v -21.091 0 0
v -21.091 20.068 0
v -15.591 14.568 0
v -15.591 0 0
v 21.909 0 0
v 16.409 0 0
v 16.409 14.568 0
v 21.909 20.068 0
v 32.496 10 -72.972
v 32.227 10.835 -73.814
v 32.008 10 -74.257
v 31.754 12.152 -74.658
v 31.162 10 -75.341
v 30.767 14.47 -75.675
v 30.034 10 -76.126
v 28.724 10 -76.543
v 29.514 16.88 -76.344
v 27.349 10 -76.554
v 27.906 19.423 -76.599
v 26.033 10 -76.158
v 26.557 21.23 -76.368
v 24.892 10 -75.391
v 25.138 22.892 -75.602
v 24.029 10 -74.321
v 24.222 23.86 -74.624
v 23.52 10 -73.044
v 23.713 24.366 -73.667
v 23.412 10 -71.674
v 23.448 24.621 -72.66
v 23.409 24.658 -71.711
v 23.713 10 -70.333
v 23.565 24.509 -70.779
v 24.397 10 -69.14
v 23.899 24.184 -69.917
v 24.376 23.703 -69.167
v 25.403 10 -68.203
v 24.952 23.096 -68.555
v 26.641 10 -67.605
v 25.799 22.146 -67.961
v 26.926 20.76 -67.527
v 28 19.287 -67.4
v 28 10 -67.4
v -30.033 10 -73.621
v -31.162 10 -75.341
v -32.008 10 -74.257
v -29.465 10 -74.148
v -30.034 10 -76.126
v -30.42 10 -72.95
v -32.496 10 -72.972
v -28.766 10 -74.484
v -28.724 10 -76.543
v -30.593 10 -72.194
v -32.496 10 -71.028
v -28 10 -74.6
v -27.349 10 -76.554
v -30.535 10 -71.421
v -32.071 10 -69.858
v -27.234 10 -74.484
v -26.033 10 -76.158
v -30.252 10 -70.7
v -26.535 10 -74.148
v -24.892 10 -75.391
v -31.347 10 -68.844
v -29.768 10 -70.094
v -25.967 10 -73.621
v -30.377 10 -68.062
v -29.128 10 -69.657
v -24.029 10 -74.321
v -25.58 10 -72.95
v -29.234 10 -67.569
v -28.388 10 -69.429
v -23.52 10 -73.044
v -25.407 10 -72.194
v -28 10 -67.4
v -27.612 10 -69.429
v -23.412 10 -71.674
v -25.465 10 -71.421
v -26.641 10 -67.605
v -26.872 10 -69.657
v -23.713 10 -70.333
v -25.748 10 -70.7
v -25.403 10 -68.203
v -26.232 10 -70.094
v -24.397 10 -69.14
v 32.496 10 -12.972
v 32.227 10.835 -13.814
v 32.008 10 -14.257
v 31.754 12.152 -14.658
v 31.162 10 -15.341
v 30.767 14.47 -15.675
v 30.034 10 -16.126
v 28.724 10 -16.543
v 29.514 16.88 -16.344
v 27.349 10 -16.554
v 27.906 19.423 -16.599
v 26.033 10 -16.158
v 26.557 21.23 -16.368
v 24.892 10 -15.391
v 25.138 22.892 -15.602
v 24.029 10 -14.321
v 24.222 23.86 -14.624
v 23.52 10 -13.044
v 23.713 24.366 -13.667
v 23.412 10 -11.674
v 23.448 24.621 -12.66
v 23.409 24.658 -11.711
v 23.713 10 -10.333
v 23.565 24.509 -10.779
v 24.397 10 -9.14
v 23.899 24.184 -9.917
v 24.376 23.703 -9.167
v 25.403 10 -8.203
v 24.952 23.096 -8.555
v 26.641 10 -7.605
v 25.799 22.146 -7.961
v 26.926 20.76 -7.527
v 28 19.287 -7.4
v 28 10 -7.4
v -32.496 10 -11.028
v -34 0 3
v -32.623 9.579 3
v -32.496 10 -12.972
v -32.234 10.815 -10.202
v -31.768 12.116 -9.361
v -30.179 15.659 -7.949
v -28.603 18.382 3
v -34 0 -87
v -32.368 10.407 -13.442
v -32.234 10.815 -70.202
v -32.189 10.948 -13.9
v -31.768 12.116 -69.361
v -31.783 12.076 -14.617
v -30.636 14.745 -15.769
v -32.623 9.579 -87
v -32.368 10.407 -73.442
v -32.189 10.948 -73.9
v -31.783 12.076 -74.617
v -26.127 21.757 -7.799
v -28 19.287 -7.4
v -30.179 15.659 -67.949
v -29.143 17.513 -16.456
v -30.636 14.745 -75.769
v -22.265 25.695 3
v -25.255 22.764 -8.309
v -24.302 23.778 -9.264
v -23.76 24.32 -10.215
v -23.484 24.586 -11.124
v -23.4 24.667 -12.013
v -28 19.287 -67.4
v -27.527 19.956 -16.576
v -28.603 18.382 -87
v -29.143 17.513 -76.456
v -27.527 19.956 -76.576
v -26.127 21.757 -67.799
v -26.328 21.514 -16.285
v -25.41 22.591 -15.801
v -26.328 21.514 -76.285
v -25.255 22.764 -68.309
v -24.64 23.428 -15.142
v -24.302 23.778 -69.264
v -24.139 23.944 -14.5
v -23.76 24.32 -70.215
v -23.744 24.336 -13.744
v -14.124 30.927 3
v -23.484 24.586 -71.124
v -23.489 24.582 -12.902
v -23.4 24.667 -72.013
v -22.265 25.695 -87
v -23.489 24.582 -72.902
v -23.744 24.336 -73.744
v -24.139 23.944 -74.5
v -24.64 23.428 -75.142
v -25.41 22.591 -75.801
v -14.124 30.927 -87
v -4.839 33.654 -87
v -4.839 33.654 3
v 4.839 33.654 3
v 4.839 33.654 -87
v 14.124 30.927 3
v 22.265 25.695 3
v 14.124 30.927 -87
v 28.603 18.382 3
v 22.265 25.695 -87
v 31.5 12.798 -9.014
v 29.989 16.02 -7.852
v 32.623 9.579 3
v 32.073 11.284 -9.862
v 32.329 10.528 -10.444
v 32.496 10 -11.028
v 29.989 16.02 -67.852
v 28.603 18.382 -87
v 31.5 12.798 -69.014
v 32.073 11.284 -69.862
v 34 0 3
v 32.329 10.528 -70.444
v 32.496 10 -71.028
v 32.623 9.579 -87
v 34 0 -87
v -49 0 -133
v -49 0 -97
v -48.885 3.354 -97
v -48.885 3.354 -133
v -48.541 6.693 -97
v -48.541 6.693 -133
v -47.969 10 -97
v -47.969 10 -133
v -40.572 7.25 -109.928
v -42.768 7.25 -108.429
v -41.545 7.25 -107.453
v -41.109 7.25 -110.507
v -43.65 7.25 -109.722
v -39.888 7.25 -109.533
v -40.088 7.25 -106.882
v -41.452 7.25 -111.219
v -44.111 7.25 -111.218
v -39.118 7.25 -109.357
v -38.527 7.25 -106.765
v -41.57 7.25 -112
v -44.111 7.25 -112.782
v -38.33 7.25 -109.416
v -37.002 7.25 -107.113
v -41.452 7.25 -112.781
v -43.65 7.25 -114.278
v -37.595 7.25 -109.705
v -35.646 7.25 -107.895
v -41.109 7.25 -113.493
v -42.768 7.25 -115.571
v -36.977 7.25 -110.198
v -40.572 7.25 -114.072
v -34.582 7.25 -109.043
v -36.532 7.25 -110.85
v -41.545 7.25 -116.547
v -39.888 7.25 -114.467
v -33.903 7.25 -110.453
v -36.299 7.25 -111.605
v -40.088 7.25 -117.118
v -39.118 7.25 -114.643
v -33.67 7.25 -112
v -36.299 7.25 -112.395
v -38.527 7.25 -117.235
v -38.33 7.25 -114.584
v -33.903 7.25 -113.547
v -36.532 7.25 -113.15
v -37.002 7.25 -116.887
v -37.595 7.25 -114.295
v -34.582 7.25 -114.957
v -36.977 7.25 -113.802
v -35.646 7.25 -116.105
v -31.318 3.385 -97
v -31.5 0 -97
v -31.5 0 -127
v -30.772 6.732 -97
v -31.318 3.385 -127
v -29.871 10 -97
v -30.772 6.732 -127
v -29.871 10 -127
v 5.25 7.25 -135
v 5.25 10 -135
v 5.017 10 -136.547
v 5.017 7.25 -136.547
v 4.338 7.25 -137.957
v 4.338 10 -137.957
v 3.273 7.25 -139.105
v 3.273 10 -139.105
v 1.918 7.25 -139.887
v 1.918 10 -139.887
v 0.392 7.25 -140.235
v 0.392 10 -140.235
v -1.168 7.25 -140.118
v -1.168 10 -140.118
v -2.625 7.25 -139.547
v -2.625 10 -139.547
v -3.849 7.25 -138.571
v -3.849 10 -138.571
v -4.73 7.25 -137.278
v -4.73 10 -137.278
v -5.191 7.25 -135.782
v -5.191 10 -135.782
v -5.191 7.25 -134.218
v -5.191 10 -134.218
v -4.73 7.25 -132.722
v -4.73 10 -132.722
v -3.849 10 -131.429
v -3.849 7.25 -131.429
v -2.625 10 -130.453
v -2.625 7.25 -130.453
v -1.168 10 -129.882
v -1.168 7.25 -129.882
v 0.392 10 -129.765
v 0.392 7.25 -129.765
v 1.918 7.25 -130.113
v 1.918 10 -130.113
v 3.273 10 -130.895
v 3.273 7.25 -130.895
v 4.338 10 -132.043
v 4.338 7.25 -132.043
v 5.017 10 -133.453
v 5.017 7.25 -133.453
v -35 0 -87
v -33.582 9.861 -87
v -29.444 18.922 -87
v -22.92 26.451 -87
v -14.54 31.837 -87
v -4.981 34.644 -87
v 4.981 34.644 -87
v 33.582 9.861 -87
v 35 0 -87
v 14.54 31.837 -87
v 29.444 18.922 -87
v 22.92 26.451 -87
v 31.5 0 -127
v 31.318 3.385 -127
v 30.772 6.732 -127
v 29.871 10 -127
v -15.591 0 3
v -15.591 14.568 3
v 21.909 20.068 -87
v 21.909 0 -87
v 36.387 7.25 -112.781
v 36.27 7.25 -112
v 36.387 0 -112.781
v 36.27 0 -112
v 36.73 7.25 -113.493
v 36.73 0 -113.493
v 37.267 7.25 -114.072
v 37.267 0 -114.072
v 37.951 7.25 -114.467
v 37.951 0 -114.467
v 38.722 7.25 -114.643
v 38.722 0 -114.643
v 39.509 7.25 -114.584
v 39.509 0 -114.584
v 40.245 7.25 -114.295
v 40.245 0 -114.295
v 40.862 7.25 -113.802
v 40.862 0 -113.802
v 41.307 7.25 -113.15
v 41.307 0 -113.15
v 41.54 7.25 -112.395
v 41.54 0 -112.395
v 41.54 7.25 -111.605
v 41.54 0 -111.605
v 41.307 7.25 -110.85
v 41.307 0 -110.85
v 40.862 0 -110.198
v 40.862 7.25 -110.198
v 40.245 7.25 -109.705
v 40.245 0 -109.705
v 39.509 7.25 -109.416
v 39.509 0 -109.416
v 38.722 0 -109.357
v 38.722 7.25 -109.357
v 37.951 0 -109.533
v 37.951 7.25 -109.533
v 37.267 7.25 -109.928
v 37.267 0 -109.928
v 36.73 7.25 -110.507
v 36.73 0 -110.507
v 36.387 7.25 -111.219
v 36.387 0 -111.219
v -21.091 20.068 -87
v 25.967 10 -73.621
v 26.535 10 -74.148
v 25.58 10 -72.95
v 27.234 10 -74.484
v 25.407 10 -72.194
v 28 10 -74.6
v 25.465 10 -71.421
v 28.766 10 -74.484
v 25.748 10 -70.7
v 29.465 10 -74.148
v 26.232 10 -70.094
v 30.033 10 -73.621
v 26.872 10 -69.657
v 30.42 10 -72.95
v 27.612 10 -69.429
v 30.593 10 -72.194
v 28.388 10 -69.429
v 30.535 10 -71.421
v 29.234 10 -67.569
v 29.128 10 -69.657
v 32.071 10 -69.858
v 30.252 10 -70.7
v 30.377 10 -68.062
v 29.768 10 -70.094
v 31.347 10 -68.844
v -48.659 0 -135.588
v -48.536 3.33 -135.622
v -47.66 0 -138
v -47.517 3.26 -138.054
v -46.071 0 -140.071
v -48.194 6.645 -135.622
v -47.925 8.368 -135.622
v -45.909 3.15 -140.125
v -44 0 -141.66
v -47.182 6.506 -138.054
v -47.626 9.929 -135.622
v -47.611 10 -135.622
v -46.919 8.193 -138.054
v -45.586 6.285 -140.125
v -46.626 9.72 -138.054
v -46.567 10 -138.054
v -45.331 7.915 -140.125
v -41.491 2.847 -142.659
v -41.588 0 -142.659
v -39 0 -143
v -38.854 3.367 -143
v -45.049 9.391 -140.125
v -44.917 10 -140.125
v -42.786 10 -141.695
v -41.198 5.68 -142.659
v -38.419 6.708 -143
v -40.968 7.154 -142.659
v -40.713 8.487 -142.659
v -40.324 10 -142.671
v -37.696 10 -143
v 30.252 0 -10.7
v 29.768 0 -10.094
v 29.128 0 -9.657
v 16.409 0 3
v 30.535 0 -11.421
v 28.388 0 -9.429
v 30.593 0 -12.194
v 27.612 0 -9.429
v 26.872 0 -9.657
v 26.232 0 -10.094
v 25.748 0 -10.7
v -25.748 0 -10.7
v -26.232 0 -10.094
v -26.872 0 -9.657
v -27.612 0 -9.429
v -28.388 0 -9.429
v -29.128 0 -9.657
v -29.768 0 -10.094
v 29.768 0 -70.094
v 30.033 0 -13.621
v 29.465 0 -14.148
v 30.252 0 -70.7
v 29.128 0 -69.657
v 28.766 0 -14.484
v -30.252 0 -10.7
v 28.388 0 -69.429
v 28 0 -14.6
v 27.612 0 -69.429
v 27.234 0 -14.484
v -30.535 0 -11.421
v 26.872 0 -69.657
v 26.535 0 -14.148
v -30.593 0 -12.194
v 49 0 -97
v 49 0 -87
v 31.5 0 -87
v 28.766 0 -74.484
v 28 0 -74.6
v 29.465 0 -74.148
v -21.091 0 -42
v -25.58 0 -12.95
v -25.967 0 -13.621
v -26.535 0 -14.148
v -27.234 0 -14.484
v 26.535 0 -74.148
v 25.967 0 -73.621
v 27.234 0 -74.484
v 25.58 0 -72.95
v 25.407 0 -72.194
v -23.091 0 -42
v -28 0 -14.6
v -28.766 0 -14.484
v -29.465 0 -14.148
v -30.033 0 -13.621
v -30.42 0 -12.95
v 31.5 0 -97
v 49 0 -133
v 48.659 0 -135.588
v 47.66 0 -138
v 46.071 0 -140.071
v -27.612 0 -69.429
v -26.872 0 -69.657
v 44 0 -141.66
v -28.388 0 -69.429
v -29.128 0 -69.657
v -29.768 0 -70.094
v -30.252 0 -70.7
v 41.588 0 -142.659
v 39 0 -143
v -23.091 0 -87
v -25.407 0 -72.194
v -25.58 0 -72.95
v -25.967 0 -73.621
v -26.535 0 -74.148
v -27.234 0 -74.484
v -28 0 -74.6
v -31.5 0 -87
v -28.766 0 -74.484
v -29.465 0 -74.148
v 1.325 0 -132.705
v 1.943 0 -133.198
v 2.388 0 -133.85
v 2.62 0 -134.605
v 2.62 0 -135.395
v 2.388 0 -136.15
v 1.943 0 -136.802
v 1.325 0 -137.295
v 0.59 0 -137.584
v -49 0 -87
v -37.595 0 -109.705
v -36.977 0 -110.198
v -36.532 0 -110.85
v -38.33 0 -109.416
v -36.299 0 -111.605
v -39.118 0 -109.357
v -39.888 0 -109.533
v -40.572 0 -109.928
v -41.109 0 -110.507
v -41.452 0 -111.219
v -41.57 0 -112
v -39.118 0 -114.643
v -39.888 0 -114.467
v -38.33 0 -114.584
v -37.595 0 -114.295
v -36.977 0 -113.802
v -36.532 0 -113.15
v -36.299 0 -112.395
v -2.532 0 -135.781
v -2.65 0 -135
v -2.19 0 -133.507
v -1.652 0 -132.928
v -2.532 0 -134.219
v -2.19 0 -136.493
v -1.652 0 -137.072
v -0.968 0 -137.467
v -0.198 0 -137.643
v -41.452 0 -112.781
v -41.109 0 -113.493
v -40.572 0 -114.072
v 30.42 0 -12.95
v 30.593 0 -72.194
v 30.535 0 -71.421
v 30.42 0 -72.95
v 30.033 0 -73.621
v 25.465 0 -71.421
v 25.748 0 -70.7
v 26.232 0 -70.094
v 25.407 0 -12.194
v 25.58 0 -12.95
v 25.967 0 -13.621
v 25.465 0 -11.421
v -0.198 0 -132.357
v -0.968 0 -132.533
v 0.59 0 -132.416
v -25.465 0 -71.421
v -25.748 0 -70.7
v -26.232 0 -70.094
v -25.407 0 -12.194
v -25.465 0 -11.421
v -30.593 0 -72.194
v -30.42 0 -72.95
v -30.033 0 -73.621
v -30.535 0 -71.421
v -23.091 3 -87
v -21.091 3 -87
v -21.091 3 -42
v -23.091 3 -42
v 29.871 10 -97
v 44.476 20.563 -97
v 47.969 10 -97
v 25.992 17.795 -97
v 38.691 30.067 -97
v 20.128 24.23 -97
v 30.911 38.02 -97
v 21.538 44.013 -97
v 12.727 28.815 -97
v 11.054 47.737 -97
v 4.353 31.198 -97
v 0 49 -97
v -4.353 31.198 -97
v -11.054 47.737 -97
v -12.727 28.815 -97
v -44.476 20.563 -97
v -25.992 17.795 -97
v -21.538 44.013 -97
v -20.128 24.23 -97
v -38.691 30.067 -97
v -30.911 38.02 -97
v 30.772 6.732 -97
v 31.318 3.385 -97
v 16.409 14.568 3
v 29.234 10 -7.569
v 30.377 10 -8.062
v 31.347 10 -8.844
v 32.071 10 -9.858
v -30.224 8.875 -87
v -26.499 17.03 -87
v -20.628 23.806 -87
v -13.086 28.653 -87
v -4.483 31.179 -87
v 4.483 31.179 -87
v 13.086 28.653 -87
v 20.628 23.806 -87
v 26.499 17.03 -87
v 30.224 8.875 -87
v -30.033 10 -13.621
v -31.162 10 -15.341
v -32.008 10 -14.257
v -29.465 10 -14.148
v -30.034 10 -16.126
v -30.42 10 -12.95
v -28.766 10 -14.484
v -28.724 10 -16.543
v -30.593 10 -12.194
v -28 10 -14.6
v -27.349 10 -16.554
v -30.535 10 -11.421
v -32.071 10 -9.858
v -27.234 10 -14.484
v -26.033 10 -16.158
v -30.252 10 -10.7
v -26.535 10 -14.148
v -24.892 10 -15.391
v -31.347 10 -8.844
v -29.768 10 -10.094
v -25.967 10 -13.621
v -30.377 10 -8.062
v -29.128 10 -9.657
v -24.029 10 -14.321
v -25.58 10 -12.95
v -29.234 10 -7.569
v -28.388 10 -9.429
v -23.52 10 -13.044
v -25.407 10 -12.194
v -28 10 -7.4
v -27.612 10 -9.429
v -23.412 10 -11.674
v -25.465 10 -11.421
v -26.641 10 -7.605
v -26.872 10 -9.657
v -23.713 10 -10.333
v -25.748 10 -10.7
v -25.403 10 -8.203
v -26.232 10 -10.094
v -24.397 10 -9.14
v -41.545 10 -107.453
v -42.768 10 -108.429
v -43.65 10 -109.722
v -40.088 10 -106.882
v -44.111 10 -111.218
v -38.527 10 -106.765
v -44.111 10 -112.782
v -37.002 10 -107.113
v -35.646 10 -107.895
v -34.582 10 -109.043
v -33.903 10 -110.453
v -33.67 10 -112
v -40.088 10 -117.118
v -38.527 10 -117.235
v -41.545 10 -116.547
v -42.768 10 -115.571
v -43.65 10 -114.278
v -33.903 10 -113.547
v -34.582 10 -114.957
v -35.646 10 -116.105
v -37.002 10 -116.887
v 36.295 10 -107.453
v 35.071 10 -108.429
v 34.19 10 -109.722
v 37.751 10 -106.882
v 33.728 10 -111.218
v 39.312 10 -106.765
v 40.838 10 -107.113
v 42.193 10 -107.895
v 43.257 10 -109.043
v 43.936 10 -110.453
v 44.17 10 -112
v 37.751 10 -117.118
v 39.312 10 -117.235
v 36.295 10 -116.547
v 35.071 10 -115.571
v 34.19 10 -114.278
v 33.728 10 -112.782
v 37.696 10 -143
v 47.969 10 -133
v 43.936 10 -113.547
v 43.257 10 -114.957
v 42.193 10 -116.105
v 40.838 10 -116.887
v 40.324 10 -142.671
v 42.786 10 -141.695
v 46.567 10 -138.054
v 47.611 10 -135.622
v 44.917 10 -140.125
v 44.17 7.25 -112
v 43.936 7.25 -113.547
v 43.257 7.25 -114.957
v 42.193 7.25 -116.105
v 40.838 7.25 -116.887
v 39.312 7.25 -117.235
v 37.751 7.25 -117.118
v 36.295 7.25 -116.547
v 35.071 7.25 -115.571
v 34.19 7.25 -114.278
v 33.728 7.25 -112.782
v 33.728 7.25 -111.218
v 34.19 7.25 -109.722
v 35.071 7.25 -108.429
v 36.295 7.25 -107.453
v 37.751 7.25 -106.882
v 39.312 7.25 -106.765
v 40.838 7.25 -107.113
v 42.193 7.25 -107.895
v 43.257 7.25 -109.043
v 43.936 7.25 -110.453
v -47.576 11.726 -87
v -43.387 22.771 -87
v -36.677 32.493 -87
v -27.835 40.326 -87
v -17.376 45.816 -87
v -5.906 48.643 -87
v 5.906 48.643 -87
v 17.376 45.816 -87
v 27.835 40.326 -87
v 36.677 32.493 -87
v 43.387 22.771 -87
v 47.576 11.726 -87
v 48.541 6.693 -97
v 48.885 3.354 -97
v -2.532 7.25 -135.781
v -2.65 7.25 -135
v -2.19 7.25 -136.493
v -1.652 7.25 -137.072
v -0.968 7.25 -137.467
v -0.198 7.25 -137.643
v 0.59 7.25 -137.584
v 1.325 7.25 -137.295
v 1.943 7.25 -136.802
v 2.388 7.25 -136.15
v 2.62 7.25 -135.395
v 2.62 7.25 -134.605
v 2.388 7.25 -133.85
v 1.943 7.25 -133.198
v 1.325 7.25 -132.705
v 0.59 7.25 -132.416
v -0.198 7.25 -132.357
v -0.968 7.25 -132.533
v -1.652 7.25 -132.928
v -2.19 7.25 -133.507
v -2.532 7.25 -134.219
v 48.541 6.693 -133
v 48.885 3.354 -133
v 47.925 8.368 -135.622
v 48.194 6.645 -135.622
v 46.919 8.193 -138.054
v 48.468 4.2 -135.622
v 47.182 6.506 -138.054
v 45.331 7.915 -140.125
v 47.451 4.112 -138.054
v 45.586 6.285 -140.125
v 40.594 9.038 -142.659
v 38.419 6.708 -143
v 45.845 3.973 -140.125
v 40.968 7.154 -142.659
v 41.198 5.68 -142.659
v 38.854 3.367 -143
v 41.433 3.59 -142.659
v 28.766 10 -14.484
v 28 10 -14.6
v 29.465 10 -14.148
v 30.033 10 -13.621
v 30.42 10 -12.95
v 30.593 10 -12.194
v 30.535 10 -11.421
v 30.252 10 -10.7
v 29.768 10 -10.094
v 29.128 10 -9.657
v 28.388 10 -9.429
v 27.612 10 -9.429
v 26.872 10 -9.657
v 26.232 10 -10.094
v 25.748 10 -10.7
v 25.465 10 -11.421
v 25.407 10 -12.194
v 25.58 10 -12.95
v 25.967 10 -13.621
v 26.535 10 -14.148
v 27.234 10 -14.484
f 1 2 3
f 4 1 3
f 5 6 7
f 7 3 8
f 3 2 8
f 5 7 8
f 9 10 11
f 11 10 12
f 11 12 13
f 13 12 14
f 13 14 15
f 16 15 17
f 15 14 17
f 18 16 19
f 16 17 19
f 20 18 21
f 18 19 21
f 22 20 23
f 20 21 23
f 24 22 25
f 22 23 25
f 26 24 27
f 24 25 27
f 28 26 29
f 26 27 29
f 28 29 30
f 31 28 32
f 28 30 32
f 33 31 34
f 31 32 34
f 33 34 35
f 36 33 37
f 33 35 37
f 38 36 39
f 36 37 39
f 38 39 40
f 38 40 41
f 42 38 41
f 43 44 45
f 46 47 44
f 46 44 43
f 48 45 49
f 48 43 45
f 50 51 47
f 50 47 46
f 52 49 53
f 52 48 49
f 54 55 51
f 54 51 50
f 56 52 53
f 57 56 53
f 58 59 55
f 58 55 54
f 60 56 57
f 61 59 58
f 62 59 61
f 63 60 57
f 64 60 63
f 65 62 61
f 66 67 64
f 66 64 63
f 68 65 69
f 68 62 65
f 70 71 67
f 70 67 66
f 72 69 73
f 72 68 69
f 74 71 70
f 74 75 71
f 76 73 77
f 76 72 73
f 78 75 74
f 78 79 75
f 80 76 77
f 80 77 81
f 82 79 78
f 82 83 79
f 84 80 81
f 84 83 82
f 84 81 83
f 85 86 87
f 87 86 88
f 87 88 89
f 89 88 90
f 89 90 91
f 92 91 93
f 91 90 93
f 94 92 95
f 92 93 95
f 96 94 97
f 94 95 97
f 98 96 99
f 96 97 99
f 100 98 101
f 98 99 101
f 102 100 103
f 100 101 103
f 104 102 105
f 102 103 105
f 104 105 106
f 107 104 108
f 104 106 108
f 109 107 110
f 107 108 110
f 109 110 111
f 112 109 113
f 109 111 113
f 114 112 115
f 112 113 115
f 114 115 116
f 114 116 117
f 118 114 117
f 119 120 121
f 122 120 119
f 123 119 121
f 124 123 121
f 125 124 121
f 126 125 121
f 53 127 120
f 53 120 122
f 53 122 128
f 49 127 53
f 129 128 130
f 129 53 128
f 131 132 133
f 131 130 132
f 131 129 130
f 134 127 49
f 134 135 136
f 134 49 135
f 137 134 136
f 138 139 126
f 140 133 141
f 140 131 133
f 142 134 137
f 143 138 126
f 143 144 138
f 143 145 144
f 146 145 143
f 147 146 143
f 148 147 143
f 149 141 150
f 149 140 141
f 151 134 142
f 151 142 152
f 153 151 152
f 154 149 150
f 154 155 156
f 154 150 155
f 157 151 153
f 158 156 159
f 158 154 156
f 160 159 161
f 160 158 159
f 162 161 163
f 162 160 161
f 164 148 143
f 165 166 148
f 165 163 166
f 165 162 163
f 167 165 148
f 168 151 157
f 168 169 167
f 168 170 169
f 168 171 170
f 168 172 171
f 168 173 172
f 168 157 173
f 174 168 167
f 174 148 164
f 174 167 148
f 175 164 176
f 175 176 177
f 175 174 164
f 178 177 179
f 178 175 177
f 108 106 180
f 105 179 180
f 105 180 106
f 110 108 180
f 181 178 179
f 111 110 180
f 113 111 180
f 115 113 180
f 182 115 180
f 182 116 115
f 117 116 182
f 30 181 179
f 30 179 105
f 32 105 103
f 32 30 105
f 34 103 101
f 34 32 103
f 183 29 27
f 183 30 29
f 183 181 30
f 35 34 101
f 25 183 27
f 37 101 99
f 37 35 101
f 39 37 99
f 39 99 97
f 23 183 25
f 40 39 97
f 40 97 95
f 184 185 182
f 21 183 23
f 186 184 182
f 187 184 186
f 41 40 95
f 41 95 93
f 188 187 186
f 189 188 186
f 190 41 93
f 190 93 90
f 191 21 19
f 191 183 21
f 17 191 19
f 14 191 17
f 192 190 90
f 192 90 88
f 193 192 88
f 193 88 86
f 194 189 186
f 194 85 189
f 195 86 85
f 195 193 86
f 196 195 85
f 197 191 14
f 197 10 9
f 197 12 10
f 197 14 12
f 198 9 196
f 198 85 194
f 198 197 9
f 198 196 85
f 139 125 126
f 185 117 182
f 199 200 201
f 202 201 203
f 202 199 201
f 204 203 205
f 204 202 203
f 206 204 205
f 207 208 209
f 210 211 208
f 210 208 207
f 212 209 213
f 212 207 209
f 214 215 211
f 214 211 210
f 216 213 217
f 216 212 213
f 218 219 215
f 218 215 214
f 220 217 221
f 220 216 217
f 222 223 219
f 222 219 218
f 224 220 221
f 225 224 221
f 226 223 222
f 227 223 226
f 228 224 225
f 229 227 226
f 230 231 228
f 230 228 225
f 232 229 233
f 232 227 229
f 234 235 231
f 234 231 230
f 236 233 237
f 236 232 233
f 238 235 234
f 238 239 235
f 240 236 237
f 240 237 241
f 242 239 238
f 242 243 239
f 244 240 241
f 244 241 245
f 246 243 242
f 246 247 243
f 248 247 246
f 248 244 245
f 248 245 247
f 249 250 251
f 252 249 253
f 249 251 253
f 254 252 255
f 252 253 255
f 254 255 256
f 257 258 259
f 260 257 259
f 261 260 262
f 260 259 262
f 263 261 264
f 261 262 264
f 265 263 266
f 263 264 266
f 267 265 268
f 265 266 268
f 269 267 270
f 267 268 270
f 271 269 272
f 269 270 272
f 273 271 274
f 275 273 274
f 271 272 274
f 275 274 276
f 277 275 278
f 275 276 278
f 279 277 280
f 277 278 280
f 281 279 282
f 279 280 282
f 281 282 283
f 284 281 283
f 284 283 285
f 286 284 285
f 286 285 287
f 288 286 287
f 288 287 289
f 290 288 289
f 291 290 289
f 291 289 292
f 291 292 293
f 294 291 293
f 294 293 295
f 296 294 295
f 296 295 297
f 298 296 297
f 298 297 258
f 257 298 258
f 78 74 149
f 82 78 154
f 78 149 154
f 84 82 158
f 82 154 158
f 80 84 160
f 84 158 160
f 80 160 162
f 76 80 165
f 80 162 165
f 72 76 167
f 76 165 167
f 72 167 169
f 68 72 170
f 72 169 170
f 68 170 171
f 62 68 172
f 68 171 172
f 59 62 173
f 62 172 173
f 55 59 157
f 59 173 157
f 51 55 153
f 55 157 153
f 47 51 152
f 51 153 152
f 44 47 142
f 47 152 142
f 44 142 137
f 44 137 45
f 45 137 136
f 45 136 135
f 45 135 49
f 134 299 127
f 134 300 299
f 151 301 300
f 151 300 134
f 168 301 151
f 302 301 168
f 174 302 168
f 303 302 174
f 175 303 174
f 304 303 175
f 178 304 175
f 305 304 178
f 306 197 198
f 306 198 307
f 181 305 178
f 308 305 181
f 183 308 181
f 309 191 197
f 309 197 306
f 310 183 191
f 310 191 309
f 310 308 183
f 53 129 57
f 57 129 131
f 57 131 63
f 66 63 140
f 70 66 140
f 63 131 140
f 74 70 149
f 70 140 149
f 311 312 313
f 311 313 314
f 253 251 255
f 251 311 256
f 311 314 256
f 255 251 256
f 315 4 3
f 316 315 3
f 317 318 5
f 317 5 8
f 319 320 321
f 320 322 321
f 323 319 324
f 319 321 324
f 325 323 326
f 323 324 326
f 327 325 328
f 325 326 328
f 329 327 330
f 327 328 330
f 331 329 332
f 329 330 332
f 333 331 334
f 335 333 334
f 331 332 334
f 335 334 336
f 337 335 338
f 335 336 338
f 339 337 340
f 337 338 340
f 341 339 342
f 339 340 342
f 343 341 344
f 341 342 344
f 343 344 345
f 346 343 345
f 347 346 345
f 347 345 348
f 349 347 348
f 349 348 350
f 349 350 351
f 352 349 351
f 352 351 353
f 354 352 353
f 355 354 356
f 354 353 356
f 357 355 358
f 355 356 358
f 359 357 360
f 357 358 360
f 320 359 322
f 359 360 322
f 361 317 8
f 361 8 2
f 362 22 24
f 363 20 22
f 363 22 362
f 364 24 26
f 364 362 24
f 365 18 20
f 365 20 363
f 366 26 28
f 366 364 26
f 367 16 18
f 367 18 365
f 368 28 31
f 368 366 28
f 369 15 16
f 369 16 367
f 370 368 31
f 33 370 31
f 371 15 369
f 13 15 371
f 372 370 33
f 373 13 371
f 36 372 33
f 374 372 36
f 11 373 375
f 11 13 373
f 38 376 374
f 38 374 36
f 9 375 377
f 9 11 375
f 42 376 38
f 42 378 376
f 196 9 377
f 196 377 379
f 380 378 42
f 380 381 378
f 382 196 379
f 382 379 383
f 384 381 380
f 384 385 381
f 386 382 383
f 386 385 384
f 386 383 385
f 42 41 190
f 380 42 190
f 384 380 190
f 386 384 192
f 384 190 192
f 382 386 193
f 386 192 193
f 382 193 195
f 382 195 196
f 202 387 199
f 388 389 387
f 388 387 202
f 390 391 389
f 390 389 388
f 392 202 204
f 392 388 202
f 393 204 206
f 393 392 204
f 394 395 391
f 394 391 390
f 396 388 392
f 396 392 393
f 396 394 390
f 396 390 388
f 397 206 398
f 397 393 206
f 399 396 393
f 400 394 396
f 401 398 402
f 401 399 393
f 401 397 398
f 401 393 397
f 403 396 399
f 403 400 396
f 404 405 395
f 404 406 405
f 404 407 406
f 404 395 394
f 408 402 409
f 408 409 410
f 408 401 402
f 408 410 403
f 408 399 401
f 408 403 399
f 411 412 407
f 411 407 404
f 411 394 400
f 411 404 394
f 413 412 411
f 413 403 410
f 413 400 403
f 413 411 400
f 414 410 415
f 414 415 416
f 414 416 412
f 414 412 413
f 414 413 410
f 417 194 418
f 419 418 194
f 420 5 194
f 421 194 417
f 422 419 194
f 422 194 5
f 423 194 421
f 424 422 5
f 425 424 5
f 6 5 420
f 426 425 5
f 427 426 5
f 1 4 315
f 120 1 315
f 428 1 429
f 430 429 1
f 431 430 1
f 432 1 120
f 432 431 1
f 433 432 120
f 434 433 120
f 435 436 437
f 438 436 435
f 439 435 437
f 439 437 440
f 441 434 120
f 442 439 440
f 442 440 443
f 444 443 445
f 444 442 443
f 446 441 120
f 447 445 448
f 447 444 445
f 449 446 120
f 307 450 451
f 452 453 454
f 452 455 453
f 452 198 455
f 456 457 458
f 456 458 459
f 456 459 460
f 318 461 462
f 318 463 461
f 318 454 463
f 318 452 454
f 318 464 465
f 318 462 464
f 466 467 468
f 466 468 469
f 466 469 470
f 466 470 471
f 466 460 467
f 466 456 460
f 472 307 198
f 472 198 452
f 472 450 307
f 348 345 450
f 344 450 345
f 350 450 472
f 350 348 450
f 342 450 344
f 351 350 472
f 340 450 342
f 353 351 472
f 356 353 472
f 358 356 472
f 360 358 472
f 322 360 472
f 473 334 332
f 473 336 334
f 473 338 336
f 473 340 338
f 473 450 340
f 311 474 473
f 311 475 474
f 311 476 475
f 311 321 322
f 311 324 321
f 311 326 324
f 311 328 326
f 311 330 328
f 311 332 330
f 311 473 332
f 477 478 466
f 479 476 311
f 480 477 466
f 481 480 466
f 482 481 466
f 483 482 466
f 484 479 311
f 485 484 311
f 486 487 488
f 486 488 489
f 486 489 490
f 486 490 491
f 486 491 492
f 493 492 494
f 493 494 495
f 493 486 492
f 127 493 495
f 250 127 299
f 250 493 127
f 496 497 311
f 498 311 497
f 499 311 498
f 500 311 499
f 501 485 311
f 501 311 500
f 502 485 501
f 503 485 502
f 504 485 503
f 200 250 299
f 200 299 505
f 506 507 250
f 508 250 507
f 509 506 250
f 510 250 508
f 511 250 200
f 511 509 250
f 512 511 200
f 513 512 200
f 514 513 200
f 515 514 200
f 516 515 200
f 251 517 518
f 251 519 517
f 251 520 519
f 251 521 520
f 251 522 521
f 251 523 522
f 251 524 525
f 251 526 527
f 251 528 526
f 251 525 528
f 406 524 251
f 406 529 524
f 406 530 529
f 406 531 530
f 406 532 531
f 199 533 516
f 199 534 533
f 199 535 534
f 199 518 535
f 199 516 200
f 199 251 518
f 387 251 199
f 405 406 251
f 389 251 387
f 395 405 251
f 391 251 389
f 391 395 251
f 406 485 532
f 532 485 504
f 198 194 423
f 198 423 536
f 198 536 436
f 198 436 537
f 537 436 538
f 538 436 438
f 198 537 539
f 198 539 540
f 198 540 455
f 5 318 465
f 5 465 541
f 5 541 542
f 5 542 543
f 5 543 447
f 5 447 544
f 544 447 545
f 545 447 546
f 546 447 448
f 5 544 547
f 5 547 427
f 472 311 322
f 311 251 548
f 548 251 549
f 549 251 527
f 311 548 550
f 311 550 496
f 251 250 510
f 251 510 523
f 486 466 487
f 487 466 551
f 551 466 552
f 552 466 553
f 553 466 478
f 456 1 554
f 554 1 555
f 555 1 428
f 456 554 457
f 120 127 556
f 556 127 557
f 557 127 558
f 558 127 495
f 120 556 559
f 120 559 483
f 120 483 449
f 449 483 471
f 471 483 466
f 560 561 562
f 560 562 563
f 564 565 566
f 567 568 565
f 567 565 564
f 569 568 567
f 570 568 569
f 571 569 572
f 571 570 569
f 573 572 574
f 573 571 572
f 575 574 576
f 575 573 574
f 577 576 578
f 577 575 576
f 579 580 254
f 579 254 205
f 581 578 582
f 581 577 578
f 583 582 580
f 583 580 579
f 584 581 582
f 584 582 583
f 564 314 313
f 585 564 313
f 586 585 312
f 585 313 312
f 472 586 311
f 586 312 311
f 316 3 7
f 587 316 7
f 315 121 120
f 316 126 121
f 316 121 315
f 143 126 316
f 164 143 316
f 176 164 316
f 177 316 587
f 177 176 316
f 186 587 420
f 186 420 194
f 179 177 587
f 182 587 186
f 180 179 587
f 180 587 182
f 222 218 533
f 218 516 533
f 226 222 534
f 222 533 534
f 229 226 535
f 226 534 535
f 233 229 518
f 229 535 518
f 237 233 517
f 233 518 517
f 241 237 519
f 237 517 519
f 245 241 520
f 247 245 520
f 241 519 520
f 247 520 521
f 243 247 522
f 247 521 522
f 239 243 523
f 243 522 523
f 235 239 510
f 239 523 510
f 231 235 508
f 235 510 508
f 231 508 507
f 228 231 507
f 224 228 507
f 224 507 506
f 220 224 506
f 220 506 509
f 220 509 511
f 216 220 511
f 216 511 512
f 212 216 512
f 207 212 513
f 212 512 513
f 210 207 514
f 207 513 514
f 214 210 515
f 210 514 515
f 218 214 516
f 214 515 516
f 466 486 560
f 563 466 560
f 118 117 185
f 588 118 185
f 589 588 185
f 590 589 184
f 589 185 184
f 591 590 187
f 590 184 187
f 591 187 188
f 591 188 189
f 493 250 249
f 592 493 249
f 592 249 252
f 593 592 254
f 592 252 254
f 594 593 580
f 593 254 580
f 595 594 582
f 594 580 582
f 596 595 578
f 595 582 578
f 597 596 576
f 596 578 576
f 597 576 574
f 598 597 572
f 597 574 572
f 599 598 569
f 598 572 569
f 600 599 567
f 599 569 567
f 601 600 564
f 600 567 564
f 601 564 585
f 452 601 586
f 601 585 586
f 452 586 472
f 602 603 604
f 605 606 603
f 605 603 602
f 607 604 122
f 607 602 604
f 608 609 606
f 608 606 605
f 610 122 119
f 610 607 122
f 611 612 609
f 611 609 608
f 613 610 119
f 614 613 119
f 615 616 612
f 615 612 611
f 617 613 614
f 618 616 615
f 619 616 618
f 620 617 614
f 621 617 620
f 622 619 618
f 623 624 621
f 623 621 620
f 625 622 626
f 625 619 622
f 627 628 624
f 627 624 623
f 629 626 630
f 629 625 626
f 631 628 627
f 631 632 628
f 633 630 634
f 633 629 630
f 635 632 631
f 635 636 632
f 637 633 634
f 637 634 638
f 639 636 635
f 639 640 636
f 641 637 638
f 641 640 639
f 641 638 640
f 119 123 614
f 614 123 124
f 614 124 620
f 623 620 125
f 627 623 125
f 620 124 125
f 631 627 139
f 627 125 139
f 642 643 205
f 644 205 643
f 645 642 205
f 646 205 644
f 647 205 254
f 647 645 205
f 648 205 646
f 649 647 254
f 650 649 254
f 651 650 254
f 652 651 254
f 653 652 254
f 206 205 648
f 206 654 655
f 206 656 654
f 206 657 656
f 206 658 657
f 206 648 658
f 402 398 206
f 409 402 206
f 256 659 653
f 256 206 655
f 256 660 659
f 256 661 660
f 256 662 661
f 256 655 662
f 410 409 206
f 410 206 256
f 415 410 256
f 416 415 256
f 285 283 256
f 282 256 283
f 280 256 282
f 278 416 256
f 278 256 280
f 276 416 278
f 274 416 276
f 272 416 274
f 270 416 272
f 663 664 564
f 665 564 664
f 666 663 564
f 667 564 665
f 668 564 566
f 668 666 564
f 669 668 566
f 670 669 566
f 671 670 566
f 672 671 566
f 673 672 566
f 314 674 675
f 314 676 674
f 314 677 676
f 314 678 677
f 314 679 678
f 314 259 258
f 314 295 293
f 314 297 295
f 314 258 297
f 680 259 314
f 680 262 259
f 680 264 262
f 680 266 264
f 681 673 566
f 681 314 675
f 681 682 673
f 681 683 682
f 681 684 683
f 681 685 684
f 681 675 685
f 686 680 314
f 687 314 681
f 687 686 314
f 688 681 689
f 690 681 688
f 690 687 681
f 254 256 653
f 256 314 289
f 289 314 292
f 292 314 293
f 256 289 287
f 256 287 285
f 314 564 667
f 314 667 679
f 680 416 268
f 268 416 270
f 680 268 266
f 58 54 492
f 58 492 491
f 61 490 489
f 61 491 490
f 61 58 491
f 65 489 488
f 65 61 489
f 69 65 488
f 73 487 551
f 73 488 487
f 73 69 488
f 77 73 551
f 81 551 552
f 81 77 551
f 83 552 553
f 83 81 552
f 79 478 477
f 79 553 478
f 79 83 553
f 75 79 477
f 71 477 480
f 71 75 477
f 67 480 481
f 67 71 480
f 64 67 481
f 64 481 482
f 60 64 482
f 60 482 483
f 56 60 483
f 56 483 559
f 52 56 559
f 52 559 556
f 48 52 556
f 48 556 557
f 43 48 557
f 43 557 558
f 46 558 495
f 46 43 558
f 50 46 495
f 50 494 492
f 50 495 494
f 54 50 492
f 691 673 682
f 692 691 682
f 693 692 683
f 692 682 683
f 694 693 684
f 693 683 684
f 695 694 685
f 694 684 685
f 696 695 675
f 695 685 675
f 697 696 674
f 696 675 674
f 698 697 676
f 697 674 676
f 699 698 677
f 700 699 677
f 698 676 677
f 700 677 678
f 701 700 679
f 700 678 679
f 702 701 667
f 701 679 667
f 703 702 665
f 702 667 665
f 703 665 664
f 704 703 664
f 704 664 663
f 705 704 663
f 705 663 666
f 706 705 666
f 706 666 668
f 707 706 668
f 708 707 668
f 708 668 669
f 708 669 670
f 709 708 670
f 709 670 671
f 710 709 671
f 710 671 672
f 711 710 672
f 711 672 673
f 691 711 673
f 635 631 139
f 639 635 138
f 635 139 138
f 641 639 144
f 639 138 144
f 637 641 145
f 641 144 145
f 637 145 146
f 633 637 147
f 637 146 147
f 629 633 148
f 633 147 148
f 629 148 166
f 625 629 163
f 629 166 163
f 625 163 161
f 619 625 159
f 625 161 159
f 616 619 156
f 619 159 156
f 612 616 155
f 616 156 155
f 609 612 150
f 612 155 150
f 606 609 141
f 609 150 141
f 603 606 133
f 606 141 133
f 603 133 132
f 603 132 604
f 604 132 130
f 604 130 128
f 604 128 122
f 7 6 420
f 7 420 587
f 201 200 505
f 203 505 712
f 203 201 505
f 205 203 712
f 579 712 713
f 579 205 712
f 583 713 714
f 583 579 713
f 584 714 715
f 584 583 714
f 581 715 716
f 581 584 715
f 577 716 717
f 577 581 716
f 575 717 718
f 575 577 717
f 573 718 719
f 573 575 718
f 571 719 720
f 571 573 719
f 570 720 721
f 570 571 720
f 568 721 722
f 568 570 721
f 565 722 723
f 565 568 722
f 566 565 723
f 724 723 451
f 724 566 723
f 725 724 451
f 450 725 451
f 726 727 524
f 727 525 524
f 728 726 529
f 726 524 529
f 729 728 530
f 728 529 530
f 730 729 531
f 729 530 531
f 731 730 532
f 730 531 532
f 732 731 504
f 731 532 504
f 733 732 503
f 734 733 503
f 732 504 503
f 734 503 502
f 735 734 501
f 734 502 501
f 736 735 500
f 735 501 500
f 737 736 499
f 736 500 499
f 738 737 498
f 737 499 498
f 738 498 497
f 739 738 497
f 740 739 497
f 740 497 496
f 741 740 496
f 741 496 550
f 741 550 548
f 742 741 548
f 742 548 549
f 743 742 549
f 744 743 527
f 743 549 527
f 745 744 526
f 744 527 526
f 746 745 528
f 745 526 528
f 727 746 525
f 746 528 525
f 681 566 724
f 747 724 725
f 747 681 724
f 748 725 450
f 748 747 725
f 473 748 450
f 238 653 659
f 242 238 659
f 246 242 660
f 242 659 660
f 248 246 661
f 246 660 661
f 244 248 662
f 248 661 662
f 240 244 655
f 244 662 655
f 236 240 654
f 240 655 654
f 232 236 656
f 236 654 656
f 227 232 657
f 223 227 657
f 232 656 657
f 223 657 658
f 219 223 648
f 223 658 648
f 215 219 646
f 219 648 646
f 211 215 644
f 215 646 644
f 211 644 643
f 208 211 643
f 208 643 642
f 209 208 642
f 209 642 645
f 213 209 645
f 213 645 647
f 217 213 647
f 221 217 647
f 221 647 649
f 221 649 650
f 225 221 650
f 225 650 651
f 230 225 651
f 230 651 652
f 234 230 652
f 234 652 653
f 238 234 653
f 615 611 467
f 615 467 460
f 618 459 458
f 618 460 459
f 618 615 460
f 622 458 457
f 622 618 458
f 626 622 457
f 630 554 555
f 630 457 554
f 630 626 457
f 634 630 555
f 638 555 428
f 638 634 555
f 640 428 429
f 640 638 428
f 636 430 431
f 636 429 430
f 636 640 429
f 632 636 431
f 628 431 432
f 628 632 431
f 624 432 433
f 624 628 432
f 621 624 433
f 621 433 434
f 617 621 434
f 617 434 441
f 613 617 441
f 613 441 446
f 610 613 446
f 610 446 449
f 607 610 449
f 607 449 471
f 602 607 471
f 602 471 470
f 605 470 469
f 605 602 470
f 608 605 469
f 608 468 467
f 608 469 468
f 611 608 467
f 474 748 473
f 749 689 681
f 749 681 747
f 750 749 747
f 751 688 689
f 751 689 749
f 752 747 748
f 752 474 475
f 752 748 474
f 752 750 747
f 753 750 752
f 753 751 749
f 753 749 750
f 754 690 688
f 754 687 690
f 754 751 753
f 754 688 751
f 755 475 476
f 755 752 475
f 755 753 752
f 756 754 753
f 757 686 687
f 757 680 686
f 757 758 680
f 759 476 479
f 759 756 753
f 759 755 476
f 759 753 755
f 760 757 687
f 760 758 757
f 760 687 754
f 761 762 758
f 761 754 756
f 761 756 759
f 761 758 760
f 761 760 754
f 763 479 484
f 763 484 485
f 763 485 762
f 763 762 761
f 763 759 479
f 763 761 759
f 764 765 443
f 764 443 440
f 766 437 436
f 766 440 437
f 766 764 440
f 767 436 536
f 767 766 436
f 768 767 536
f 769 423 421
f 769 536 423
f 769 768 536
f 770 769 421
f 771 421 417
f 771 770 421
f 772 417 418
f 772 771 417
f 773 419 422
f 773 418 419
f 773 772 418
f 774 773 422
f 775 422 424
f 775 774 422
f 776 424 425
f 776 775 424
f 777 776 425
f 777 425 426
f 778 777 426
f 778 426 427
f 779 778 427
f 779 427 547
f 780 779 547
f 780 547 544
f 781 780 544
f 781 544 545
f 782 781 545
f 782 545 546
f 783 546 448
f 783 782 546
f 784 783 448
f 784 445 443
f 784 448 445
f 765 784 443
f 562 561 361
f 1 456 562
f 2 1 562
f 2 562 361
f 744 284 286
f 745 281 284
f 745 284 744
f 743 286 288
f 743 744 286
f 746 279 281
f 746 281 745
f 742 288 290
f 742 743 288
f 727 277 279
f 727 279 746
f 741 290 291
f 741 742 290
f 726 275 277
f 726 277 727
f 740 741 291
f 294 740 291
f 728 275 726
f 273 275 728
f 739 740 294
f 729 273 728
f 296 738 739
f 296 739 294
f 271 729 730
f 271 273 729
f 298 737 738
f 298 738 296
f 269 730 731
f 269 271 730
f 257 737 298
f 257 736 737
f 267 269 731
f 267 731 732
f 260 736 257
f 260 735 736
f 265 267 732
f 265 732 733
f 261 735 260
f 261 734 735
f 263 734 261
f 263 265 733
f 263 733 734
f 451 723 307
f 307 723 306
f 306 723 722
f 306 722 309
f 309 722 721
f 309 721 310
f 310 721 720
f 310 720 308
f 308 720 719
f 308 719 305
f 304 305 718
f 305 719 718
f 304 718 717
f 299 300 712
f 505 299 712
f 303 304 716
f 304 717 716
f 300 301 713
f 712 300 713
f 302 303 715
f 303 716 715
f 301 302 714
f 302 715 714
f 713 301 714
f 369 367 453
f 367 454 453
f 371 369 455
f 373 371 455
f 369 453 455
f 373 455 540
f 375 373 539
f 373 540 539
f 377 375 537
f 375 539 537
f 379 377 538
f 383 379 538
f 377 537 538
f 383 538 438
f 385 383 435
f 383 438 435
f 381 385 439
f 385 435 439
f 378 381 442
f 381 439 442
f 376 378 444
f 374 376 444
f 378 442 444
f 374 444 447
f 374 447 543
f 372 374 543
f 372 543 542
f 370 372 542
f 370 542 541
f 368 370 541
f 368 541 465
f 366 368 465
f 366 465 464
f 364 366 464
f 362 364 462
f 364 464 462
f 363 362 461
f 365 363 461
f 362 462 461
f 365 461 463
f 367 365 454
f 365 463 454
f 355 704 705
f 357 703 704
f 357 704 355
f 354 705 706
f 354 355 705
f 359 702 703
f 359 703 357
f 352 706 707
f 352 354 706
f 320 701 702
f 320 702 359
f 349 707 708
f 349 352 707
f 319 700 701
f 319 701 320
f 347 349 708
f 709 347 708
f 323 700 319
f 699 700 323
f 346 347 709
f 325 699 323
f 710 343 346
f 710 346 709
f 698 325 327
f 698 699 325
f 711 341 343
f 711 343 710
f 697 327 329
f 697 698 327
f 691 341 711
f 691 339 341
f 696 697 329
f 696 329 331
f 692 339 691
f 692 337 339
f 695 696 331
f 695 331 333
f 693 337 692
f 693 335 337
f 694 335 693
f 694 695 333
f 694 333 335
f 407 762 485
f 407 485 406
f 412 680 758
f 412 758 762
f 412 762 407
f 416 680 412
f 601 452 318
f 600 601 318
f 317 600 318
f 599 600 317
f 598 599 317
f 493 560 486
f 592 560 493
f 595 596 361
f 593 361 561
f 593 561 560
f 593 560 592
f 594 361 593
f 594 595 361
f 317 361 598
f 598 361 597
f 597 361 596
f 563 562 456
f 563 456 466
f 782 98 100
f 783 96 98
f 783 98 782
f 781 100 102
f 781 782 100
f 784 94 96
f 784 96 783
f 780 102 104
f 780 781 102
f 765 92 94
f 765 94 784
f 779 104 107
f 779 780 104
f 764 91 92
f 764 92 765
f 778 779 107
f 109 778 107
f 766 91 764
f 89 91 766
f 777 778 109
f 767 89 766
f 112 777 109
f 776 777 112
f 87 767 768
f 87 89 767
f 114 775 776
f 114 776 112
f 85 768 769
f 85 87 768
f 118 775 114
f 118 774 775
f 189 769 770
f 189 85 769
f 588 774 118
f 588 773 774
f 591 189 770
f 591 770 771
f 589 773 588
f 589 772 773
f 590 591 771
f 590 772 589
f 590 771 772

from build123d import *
from build123d.topology import SkipClean

# Parameters (mm, degrees)
ESQUISSE2_R                                      = 31.5
ESQUISSE2_W                                      = 32
ESQUISSE2_H                                      = 32
BOSS_EXTRU_1_DEPTH                               = 3
BOSS_EXTRU_2_START                               = -100
ESQUISSE4_R                                      = 35
ESQUISSE4_R_2                                    = 31.5
BOSS_EXTRU_2_DEPTH                               = 100
BOSS_EXTRU_3_OUTLINE_R                           = 31.5
BOSS_EXTRU_3_OUTLINE_W                           = 43
BOSS_EXTRU_3_OUTLINE_H                           = 42.5
BOSS_EXTRU_3_DEPTH                               = 97
ESQUISSE6_R                                      = 31.5
ENL_V_MAT_EXTRU_1_DEPTH                          = 10
ESQUISSE7_R                                      = 49
ESQUISSE7_R_2                                    = 35
BOSS_EXTRU_4_DEPTH                               = 10
BOSS_EXTRU_5_START                               = 30
BOSS_EXTRU_5_DEPTH                               = 30
BOSS_EXTRU_6_START                               = 16
BOSS_EXTRU_6_DEPTH                               = 16
CONG_1_R                                         = 10
ESQUISSE11_W                                     = 137.068824
ESQUISSE11_H                                     = 50.889867
ENL_V_MAT_EXTRU_2_DEPTH                          = 153
CHAMBRAGE_POUR_VIS_T_TE_RONDE_6_PANS_D           = 5.3
CHAMBRAGE_POUR_VIS_T_TE_RONDE_6_PANS_DEPTH       = 18
CHAMBRAGE_POUR_VIS_T_TE_RONDE_6_PANS_CBORE_D     = 10.5
CHAMBRAGE_POUR_VIS_T_TE_RONDE_6_PANS_CBORE_DEPTH = 2.75
CHAMBRAGE_POUR_VIS_T_TE_RONDE_6_PANS_TIP         = 1.592281
ESQUISSE18_R                                     = 2.6
ENL_V_MAT_EXTRU_4_DEPTH                          = 25
ESQUISSE19_R                                     = 4.6
ENL_V_MAT_EXTRU_5_DEPTH                          = 25
ESQUISSE20_W                                     = 2
ESQUISSE20_H                                     = 3
ENL_V_MAT_EXTRU_6_DEPTH                          = 45
ENL_V_START                                      = -90
ENL_V_MAT_EXTRU_7_DEPTH                          = 90


# Read off the part's stored shape, not the designer's step: Boss.-Extru.3
with BuildPart() as part:
    # Esquisse2 → Boss.-Extru.1 (new body)
    with BuildSketch(Plane.XY):
        Circle(ESQUISSE2_R)
        with Locations((0.409228, -1.432297)):
            Rectangle(ESQUISSE2_W, ESQUISSE2_H, mode=Mode.SUBTRACT)
    extrude(amount=BOSS_EXTRU_1_DEPTH)

    # Esquisse4 → Boss.-Extru.2 (add)
    with BuildSketch(Plane.XY.offset(3).offset(BOSS_EXTRU_2_START)):
        Circle(ESQUISSE4_R)
        Circle(ESQUISSE4_R_2, mode=Mode.SUBTRACT)
    extrude(amount=BOSS_EXTRU_2_DEPTH)

    # Boss.-Extru.3 outline → Boss.-Extru.3 (add)
    with BuildSketch(Plane(origin=(0, 0, 0), x_dir=(-1, 0, 0), z_dir=(0, 0, -1))):
        Circle(BOSS_EXTRU_3_OUTLINE_R)
        with Locations((-0.409228, -1.182297)):
            Rectangle(BOSS_EXTRU_3_OUTLINE_W, BOSS_EXTRU_3_OUTLINE_H, mode=Mode.SUBTRACT)
    extrude(amount=BOSS_EXTRU_3_DEPTH)

    # Esquisse6 → Enlèv. mat.-Extru.1 (cut)
    with BuildSketch(Plane(origin=(0, 0, -97), x_dir=(-1, 0, 0), z_dir=(0, 0, -1))):
        Circle(ESQUISSE6_R)
    extrude(amount=-ENL_V_MAT_EXTRU_1_DEPTH, mode=Mode.SUBTRACT)

    # Esquisse7 → Boss.-Extru.4 (add)
    with BuildSketch(Plane(origin=(0, 0, -97), x_dir=(-1, 0, 0), z_dir=(0, 0, -1))):
        Circle(ESQUISSE7_R)
        with Locations(Location((0, 0, 0), (0, 0, 180))):
            Circle(ESQUISSE7_R_2, mode=Mode.SUBTRACT)
    extrude(amount=-BOSS_EXTRU_4_DEPTH)

    # Esquisse8 → Boss.-Extru.5 (add)
    with SkipClean():  # the faces are left unmerged after this step: merging them gives an invalid solid
        with BuildSketch(Plane(origin=(0, 0, -97), x_dir=(-1, 0, 0), z_dir=(0, 0, -1)).offset(BOSS_EXTRU_5_START)):
            with BuildLine():
                Line((-47.96874, 10), (-29.870554, 10))
                ThreePointArc((-29.870554, 10), (-31.5, 0), (-29.870554, -10))
                Line((-29.870554, -10), (-47.96874, -10))
                ThreePointArc((-47.96874, -10), (-49, 0), (-47.96874, 10))
            make_face()
            with BuildLine():
                Line((29.870554, 10), (47.96874, 10))
                ThreePointArc((47.96874, 10), (49, 0), (47.96874, -10))
                Line((47.96874, -10), (29.870554, -10))
                ThreePointArc((29.870554, -10), (31.5, 0), (29.870554, 10))
            make_face()
        extrude(amount=-BOSS_EXTRU_5_DEPTH)

    # Esquisse10 → Boss.-Extru.6 (add)
    with SkipClean():  # the faces are left unmerged after this step: merging them gives an invalid solid
        with BuildSketch(Plane(origin=(0, 0, -127), x_dir=(-1, 0, 0), z_dir=(0, 0, -1)).offset(BOSS_EXTRU_6_START)):
            with BuildLine():
                Line((47.96874, 10), (-47.96874, 10))
                ThreePointArc((-47.96874, 10), (-49, 0), (-47.96874, -10))
                Line((-47.96874, -10), (47.96874, -10))
                ThreePointArc((47.96874, -10), (49, 0), (47.96874, 10))
            make_face()
        extrude(amount=-BOSS_EXTRU_6_DEPTH)

    # Congé1
    cong_1_edges = [part.edges().sort_by_distance(p)[0] for p in [
        (-49, 0, -143),
        (49, 0, -143),
    ]]
    fillet(cong_1_edges, radius=CONG_1_R)

    # Esquisse11 → Enlèv. mat.-Extru.2 (cut)
    with SkipClean():  # the faces are left unmerged after this step: merging them gives an invalid solid
        with BuildSketch(Plane(origin=(0, 0, -143), x_dir=(-1, 0, 0), z_dir=(0, 0, -1))):
            with Locations((0, -25.444933)):
                Rectangle(ESQUISSE11_W, ESQUISSE11_H)
        extrude(amount=-ENL_V_MAT_EXTRU_2_DEPTH, mode=Mode.SUBTRACT)

    # Chambrage pour Vis à tête ronde à 6 pans creux M51
    with Locations(Plane(origin=(0, 10, 0), x_dir=(1, 0, 0), z_dir=(0, 1, 0))):
        with Locations((-38.919647, 112), (38.919647, 112), (0, 135)):
            CounterBoreHole(CHAMBRAGE_POUR_VIS_T_TE_RONDE_6_PANS_D / 2, CHAMBRAGE_POUR_VIS_T_TE_RONDE_6_PANS_CBORE_D / 2, CHAMBRAGE_POUR_VIS_T_TE_RONDE_6_PANS_CBORE_DEPTH, depth=CHAMBRAGE_POUR_VIS_T_TE_RONDE_6_PANS_DEPTH)
            with Locations((0, 0, -(CHAMBRAGE_POUR_VIS_T_TE_RONDE_6_PANS_DEPTH + CHAMBRAGE_POUR_VIS_T_TE_RONDE_6_PANS_TIP / 2))):  # 118° drill point
                Cone(0, CHAMBRAGE_POUR_VIS_T_TE_RONDE_6_PANS_D / 2, CHAMBRAGE_POUR_VIS_T_TE_RONDE_6_PANS_TIP, mode=Mode.SUBTRACT)

    # Esquisse18 → Enlèv. mat.-Extru.4 (cut, symmetric)
    with SkipClean():  # the faces are left unmerged after this step: merging them gives an invalid solid
        with BuildSketch(Plane(origin=(0, 15, 0), x_dir=(-1, 0, 0), z_dir=(0, -1, 0))):
            with Locations(Location((28, 12, 0), (0, 0, 90))):
                Circle(ESQUISSE18_R)
            with Locations(Location((-28, 12, 0), (0, 0, 90))):
                Circle(ESQUISSE18_R)
            with Locations(Location((28, 72, 0), (0, 0, 90))):
                Circle(ESQUISSE18_R)
            with Locations(Location((-28, 72, 0), (0, 0, 90))):
                Circle(ESQUISSE18_R)
        extrude(amount=ENL_V_MAT_EXTRU_4_DEPTH, both=True, mode=Mode.SUBTRACT)

    # Esquisse19 → Enlèv. mat.-Extru.5 (cut)
    with SkipClean():  # the faces are left unmerged after this step: merging them gives an invalid solid
        with BuildSketch(Plane.ZX.offset(35)):
            with Locations((-72, 28)):
                Circle(ESQUISSE19_R)
            with Locations((-12, 28)):
                Circle(ESQUISSE19_R)
            with Locations((-12, -28)):
                Circle(ESQUISSE19_R)
            with Locations((-72, -28)):
                Circle(ESQUISSE19_R)
        extrude(amount=-ENL_V_MAT_EXTRU_5_DEPTH, mode=Mode.SUBTRACT)

    # Esquisse20 → Enlèv. mat.-Extru.6 (cut)
    with SkipClean():  # the faces are left unmerged after this step: merging them gives an invalid solid
        with BuildSketch(Plane(origin=(0, 0, -87), x_dir=(-1, 0, 0), z_dir=(0, 0, -1))):
            with Locations((22.090772, 1.5)):
                Rectangle(ESQUISSE20_W, ESQUISSE20_H)
        extrude(amount=-ENL_V_MAT_EXTRU_6_DEPTH, mode=Mode.SUBTRACT)

    # Esquisse21 → Enlèv. mat.-Extru.7 (cut)
    with SkipClean():  # the faces are left unmerged after this step: merging them gives an invalid solid
        with BuildSketch(Plane.XY.offset(3).offset(ENL_V_START)):
            with BuildLine():
                Line((-35, 0), (-34, 0))
                ThreePointArc((-34, 0), (0, 34), (34, 0))
                Line((34, 0), (35, 0))
                ThreePointArc((35, 0), (0, 35), (-35, 0))
            make_face()
        extrude(amount=ENL_V_MAT_EXTRU_7_DEPTH, mode=Mode.SUBTRACT)


solid = part.part
